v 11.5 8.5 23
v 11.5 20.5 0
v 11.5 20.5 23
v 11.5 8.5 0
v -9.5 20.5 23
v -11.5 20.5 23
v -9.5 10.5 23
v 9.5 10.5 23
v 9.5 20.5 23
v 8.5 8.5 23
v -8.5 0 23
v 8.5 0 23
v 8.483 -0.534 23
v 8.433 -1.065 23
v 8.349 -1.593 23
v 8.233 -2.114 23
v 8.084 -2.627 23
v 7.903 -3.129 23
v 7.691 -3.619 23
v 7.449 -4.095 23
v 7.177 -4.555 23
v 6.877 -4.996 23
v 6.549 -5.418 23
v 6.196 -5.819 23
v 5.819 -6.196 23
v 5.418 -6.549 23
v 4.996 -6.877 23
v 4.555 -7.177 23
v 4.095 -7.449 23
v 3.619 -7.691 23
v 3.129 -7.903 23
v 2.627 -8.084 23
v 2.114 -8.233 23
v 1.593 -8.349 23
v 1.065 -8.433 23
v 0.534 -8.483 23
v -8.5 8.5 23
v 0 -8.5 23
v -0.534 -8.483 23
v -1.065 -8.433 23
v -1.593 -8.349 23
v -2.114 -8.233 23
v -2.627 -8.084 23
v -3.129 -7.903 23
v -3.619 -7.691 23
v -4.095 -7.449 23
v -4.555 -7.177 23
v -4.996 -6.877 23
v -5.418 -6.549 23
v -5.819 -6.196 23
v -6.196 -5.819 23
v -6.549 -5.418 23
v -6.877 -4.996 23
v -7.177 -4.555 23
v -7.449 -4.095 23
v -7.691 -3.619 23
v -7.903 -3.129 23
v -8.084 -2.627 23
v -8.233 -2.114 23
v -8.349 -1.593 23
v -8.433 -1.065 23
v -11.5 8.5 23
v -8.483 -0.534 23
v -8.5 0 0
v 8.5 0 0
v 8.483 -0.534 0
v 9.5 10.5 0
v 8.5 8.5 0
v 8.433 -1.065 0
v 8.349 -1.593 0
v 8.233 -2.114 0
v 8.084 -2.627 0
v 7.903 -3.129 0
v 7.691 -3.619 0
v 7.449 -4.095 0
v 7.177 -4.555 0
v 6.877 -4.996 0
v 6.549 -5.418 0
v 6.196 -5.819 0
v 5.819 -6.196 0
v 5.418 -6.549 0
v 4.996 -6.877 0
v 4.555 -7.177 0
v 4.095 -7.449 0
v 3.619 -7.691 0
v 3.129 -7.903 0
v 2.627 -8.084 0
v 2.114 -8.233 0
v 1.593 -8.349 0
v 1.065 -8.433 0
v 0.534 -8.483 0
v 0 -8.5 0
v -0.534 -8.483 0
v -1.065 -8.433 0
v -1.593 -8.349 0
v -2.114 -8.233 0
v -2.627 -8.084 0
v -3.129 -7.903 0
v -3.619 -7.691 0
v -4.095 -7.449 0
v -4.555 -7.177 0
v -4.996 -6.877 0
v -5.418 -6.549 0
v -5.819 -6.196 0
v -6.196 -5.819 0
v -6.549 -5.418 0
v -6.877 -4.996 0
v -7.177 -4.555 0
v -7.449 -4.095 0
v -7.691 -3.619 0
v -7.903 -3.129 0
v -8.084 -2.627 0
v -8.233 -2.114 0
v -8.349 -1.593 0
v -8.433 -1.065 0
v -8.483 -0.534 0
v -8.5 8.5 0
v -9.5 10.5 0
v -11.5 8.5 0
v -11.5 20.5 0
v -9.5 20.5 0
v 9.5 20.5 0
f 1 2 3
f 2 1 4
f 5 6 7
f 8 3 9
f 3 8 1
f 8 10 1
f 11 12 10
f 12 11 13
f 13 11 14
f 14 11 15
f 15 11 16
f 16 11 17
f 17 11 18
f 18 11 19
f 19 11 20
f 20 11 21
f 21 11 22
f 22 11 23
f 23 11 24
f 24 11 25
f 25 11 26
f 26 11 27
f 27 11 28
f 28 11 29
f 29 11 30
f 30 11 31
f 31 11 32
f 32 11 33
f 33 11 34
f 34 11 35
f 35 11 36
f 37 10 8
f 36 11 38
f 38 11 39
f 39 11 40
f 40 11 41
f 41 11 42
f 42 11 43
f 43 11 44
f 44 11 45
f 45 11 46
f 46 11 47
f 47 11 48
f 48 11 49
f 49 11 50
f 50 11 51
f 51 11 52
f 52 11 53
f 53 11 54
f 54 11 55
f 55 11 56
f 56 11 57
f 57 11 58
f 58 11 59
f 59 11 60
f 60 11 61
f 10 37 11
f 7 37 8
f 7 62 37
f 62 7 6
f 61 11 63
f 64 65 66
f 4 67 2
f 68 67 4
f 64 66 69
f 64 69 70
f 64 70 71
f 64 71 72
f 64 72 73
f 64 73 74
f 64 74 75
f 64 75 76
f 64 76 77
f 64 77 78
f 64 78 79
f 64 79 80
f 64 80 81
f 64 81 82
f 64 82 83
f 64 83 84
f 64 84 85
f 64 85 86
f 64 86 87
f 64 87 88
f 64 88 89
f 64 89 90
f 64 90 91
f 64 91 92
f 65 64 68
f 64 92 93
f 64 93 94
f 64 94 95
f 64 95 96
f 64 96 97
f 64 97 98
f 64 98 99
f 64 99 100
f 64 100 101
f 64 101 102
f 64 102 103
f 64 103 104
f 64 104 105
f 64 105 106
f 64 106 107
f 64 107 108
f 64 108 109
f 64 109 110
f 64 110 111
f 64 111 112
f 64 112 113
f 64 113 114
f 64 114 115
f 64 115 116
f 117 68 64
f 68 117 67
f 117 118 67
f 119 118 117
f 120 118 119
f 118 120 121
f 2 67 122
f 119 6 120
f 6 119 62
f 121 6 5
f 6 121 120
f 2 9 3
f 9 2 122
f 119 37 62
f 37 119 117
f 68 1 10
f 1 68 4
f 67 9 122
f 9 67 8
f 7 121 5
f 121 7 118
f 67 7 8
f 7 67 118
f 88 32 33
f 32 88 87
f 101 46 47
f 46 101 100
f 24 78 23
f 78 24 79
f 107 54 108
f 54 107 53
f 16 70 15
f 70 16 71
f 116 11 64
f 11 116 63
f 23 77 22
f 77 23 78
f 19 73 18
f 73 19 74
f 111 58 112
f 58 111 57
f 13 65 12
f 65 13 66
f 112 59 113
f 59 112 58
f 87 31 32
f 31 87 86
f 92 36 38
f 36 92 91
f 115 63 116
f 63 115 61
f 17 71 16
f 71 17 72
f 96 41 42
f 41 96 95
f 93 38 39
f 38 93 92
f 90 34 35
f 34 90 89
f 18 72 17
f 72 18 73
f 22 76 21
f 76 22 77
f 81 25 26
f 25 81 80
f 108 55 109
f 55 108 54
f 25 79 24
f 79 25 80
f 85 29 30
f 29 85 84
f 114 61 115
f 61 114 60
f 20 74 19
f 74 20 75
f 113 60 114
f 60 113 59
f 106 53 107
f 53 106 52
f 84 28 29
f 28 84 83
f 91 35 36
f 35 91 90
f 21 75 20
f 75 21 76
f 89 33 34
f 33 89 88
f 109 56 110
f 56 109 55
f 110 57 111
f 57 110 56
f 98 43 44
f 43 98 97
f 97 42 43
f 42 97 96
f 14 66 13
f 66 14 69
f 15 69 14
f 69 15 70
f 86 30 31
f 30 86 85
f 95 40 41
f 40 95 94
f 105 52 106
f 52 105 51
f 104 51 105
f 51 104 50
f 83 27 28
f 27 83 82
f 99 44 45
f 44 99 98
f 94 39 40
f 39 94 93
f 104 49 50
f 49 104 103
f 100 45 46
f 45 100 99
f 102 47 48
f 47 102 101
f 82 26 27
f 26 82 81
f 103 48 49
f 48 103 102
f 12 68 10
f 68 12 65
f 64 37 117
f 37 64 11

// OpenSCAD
union() {
    translate([-11.5, 8.5, 0]) 
        difference() {
            cube([23, 12, 23]);
            translate([2, 2, 0]) cube([19, 10, 23]);
        }
    cylinder(d=17, h=23, $fn=100);
    translate([-8.5, 0, 0]) cube([17, 8.5, 23]);
}
